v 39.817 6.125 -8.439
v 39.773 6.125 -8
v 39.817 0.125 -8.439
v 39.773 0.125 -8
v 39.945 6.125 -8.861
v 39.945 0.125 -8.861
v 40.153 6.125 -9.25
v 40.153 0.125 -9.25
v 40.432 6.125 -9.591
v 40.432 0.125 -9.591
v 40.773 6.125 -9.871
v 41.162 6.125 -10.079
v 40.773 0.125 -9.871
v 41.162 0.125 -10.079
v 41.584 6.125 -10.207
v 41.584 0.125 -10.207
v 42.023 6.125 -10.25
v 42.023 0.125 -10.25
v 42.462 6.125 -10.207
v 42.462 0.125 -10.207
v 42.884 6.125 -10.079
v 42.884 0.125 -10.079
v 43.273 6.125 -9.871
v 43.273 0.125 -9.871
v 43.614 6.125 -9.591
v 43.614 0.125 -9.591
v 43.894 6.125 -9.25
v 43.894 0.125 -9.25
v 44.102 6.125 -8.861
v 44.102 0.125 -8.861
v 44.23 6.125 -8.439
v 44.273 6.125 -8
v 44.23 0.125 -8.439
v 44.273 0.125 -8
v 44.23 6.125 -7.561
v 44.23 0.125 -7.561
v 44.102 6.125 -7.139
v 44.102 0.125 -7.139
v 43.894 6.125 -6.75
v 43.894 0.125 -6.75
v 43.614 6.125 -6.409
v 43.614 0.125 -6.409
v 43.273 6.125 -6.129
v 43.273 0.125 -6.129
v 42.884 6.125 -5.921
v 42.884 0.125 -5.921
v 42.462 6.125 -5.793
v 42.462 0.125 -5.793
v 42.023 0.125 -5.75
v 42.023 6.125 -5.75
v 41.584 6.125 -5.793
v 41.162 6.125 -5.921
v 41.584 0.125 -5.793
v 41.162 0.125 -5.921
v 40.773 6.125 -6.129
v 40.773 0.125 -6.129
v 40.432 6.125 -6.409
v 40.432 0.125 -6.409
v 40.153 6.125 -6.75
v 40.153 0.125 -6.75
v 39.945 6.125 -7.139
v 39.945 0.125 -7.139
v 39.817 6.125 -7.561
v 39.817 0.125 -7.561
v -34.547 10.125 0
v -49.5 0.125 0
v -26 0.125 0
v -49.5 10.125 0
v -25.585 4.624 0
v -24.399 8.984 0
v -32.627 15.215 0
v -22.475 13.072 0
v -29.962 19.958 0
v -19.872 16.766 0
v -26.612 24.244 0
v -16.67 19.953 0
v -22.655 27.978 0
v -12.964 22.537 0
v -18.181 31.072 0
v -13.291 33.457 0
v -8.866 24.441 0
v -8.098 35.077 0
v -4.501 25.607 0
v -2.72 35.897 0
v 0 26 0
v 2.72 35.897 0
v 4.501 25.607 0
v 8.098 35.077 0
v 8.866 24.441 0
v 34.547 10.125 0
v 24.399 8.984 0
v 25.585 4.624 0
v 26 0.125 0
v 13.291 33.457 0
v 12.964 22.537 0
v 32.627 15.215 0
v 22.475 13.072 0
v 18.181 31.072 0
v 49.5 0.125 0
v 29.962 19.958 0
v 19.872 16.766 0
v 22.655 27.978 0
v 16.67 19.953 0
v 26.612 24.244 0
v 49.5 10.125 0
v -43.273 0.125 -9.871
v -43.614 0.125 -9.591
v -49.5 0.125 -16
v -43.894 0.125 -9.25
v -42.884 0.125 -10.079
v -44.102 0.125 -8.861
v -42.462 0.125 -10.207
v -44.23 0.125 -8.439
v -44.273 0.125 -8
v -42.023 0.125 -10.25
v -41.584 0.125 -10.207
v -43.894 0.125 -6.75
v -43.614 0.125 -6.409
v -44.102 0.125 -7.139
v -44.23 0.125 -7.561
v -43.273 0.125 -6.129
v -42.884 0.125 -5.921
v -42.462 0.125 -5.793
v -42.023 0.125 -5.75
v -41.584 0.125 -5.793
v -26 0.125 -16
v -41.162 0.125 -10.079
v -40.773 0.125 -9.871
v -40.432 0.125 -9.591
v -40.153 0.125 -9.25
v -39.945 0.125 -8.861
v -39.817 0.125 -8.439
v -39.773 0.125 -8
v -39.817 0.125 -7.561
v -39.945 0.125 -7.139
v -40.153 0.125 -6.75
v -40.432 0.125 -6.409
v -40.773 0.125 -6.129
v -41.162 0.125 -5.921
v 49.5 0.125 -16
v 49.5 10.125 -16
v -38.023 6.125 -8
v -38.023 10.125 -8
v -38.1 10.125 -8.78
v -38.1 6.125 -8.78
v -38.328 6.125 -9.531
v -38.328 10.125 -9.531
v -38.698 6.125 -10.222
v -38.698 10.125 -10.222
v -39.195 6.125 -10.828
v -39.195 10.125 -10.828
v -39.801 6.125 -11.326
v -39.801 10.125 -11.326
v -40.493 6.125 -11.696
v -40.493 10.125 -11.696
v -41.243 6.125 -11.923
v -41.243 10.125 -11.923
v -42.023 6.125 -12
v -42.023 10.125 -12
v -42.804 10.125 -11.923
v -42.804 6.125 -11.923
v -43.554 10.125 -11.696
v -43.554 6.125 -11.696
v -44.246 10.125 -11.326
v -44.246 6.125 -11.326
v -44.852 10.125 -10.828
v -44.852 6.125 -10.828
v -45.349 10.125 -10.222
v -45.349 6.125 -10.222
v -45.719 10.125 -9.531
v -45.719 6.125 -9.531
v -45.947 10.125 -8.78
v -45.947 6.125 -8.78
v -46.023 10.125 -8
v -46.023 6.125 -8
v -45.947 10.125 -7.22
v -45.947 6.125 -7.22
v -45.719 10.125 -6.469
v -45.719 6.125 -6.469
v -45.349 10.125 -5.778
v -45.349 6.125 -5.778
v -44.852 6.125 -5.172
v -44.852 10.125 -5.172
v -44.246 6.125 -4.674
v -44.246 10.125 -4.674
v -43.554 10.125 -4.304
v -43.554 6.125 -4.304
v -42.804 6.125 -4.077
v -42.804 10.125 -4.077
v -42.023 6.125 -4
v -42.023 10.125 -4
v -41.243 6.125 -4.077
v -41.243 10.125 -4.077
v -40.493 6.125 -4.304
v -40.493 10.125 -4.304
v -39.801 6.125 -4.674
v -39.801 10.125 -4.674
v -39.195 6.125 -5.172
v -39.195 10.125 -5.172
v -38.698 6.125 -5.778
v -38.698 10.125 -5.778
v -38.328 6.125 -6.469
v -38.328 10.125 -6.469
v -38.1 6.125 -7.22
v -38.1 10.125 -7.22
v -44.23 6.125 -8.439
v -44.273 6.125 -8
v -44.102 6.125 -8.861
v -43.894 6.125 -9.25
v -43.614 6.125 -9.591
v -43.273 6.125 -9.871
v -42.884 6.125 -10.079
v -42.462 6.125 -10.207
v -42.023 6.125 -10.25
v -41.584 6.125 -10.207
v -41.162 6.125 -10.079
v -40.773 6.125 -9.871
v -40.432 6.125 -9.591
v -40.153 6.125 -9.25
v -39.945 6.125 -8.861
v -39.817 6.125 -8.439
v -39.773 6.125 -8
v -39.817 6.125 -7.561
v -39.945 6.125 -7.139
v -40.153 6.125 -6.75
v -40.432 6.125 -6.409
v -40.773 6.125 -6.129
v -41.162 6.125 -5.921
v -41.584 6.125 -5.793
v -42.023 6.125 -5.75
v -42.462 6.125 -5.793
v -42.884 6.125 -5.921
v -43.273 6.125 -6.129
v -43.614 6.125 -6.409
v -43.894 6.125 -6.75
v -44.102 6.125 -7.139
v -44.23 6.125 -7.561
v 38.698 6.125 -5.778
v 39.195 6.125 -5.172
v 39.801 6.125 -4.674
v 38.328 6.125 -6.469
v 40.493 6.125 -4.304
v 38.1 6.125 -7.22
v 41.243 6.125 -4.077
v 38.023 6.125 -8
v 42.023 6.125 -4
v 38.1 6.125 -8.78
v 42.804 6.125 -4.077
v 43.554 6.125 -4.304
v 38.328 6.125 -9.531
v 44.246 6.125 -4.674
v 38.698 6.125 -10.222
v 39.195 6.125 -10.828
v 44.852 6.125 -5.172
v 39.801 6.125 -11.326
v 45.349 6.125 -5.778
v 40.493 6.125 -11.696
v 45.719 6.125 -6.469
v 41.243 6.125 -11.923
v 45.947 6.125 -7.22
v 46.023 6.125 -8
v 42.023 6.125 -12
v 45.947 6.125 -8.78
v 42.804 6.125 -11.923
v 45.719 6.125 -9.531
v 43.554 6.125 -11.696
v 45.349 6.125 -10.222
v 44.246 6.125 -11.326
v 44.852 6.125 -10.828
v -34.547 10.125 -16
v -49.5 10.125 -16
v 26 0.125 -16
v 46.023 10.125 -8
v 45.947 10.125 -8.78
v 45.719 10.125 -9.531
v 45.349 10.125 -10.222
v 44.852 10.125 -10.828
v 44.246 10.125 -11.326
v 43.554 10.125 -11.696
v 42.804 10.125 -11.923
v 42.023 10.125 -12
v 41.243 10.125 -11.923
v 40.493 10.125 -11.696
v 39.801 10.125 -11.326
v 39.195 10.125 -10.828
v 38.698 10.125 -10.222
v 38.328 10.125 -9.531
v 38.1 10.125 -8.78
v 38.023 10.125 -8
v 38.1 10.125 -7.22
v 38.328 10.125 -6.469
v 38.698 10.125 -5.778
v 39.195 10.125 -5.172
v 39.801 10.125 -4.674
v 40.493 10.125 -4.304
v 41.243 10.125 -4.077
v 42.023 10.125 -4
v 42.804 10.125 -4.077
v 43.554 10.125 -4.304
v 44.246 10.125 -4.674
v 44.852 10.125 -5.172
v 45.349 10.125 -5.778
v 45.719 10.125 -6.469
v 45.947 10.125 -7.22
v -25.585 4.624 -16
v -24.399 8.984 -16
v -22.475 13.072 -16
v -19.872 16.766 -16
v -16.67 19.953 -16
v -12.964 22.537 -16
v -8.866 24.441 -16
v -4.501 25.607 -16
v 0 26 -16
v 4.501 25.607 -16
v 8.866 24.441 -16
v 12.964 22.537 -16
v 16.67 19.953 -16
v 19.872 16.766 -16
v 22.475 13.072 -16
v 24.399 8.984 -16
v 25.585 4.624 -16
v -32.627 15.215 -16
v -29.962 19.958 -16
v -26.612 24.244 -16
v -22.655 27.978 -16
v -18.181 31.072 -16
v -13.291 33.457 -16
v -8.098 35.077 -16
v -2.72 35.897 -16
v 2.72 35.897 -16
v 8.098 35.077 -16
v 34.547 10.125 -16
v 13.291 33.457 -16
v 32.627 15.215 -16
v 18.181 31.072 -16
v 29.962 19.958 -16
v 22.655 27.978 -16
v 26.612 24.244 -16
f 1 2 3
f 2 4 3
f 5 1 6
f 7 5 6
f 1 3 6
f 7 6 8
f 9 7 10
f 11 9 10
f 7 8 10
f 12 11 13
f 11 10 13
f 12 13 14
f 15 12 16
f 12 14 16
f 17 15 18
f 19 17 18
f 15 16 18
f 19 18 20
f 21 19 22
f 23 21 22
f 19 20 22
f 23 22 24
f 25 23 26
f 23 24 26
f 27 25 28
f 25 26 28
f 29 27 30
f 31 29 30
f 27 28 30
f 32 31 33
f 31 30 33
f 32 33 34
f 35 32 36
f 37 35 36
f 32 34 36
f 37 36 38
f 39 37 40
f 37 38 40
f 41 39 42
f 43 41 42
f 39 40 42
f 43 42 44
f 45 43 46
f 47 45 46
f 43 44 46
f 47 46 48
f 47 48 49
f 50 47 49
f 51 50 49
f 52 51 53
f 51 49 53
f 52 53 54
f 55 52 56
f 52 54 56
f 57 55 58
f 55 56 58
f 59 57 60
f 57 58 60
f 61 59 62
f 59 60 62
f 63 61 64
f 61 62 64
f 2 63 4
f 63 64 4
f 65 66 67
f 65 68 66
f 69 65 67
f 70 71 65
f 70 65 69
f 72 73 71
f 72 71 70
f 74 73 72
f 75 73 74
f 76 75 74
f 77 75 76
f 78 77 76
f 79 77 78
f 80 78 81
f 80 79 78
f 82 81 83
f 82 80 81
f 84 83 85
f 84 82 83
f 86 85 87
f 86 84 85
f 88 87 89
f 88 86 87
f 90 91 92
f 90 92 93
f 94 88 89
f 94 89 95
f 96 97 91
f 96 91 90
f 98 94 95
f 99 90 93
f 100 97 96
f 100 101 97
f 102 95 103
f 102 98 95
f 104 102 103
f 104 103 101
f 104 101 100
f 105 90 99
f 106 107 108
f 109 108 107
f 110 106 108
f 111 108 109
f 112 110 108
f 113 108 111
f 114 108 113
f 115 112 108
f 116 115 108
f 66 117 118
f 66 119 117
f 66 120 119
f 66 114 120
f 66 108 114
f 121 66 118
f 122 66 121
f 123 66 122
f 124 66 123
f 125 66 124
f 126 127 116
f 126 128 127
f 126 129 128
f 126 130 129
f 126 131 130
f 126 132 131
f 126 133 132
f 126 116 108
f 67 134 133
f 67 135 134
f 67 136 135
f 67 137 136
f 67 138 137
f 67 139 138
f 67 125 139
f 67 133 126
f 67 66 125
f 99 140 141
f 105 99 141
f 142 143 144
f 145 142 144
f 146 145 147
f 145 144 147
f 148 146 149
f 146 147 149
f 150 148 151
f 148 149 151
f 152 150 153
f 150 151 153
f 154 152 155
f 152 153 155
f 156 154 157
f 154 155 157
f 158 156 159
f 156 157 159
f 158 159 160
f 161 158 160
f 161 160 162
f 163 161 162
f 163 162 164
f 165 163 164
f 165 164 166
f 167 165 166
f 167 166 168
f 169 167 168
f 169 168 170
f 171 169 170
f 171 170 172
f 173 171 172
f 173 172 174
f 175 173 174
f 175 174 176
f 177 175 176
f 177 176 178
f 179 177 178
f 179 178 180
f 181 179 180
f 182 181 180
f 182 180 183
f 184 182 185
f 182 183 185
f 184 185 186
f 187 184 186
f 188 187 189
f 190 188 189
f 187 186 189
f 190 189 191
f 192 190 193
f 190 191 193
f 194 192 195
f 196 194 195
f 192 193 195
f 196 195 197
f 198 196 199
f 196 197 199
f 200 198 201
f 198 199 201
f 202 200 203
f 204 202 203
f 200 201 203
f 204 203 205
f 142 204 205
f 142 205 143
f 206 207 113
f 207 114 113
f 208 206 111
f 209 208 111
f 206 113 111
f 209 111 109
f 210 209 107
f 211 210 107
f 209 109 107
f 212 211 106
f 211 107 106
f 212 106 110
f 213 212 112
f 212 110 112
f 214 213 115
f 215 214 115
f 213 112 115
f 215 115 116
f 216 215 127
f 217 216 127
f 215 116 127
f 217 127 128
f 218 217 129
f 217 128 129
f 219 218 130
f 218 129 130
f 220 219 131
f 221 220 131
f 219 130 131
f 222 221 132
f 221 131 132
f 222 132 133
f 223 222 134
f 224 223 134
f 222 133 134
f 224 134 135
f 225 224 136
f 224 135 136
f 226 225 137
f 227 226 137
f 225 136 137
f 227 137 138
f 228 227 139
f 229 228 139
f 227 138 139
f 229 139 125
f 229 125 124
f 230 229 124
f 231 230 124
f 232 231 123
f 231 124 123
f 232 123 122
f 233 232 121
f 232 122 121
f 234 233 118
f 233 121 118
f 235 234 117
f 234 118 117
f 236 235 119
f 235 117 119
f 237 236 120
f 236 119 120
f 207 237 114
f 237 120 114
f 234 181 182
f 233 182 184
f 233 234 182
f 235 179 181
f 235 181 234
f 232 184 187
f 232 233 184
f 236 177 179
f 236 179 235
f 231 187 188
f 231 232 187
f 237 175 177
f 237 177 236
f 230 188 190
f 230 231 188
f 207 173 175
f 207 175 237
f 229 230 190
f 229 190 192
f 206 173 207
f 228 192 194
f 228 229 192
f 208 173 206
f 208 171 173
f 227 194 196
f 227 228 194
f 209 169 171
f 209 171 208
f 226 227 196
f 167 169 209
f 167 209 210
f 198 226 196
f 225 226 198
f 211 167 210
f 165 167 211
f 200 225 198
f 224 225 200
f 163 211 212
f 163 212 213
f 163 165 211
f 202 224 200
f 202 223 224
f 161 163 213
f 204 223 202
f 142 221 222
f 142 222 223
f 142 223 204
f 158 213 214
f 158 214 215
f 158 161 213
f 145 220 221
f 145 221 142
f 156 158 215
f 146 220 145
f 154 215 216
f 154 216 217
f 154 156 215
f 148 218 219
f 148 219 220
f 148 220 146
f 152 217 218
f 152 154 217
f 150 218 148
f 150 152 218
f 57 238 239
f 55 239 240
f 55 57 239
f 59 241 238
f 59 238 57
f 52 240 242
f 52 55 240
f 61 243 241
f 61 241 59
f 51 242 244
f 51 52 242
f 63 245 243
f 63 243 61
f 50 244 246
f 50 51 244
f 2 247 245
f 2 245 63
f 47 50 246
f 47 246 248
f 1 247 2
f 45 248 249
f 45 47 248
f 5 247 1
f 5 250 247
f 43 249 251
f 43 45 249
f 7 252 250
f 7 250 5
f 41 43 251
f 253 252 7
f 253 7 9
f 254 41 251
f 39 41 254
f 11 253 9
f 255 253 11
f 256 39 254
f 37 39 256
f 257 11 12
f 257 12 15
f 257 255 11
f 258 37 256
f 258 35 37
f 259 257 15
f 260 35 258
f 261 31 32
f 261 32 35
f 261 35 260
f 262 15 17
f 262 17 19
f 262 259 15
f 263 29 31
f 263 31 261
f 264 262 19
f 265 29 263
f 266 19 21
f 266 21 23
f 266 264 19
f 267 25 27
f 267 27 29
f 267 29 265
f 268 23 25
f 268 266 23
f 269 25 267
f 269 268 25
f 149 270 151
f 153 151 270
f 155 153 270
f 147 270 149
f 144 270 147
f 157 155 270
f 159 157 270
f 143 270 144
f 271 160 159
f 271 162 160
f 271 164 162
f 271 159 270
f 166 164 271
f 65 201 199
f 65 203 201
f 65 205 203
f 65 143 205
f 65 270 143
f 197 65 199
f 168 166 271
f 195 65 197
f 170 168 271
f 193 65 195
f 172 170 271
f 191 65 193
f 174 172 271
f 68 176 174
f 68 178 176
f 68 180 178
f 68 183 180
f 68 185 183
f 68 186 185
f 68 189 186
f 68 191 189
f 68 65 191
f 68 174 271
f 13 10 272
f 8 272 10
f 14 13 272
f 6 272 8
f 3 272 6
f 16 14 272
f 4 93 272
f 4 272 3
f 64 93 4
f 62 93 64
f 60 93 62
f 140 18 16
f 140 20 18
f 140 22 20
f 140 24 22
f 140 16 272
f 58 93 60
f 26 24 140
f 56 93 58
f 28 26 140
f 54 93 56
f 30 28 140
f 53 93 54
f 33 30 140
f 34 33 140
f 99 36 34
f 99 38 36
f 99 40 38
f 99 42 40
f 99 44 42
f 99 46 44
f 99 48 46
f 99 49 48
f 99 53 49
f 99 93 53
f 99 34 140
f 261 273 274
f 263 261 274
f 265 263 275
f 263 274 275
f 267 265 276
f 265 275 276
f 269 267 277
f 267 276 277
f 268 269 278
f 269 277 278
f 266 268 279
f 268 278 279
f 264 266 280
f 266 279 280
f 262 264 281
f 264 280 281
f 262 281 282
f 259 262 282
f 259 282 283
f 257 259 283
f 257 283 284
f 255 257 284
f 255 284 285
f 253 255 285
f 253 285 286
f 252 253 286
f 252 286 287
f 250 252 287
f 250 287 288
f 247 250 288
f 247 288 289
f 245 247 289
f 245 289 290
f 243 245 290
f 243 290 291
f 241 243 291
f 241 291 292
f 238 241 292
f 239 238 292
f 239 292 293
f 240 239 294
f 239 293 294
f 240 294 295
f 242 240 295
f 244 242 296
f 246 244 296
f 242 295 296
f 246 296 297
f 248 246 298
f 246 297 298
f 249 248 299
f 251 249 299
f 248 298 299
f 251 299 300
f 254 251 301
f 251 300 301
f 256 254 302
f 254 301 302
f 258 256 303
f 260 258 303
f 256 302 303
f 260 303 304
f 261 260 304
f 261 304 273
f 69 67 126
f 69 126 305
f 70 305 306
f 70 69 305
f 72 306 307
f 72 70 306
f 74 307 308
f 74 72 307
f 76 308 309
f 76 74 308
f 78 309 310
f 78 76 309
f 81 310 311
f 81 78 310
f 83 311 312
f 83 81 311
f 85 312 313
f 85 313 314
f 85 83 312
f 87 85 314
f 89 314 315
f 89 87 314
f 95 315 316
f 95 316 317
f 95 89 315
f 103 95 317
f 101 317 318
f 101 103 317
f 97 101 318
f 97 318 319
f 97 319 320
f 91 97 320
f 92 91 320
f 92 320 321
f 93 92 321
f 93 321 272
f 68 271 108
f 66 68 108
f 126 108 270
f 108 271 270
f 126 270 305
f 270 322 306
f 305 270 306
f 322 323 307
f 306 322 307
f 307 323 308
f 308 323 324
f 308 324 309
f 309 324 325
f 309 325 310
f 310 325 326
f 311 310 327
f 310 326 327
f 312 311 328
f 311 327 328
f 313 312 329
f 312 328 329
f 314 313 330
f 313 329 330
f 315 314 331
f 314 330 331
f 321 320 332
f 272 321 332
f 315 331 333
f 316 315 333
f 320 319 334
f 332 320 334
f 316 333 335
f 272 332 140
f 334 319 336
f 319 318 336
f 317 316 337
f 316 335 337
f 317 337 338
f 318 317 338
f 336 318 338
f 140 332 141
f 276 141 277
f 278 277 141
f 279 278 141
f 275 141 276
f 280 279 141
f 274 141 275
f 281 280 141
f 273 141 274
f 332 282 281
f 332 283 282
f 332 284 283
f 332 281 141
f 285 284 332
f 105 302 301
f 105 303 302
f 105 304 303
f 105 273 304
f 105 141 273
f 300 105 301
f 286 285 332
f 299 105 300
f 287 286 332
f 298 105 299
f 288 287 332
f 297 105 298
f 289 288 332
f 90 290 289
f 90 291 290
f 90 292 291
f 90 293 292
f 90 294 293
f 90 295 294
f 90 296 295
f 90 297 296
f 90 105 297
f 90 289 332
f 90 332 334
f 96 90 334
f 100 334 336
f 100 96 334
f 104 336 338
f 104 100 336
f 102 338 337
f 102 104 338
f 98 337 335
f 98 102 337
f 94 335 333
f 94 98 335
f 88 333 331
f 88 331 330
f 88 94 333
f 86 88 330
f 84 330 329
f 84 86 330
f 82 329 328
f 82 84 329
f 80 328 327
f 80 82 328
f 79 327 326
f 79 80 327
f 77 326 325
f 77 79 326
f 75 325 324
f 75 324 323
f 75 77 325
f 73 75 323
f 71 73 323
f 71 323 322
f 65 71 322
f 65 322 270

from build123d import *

# Parameters (mm, degrees)
BOSS_EXTRUDE1_DEPTH            = 16
CBORE_FOR_M4_SHCS1_D           = 4.5
CBORE_FOR_M4_SHCS1_CBORE_D     = 8
CBORE_FOR_M4_SHCS1_CBORE_DEPTH = 4


with BuildPart() as part:
    # Sketch2 → Boss-Extrude1 (new body)
    with BuildSketch(Plane.XY):
        with BuildLine():
            Line((-49.5, 0.125), (-25.999699517, 0.125))
            ThreePointArc((-25.999699517, 0.125), (0, 26), (25.999699517, 0.125))
            Line((25.999699517, 0.125), (49.5, 0.125))
            Line((49.5, 0.125), (49.5, 10.125))
            Line((49.5, 10.125), (34.546843199, 10.125))
            ThreePointArc((34.546843199, 10.125), (0, 36), (-34.546843199, 10.125))
            Line((-34.546843199, 10.125), (-49.5, 10.125))
            Line((-49.5, 10.125), (-49.5, 0.125))
        make_face()
    extrude(amount=-BOSS_EXTRUDE1_DEPTH)

    # CBORE for M4 SHCS1 (through all)
    with Locations(Plane(origin=(0, 10.125, 0), x_dir=(1, 0, 0), z_dir=(0, 1, 0))):
        with Locations((-42.023421599, 8), (42.023421599, 8)):
            CounterBoreHole(CBORE_FOR_M4_SHCS1_D / 2, CBORE_FOR_M4_SHCS1_CBORE_D / 2, CBORE_FOR_M4_SHCS1_CBORE_DEPTH)


solid = part.part
